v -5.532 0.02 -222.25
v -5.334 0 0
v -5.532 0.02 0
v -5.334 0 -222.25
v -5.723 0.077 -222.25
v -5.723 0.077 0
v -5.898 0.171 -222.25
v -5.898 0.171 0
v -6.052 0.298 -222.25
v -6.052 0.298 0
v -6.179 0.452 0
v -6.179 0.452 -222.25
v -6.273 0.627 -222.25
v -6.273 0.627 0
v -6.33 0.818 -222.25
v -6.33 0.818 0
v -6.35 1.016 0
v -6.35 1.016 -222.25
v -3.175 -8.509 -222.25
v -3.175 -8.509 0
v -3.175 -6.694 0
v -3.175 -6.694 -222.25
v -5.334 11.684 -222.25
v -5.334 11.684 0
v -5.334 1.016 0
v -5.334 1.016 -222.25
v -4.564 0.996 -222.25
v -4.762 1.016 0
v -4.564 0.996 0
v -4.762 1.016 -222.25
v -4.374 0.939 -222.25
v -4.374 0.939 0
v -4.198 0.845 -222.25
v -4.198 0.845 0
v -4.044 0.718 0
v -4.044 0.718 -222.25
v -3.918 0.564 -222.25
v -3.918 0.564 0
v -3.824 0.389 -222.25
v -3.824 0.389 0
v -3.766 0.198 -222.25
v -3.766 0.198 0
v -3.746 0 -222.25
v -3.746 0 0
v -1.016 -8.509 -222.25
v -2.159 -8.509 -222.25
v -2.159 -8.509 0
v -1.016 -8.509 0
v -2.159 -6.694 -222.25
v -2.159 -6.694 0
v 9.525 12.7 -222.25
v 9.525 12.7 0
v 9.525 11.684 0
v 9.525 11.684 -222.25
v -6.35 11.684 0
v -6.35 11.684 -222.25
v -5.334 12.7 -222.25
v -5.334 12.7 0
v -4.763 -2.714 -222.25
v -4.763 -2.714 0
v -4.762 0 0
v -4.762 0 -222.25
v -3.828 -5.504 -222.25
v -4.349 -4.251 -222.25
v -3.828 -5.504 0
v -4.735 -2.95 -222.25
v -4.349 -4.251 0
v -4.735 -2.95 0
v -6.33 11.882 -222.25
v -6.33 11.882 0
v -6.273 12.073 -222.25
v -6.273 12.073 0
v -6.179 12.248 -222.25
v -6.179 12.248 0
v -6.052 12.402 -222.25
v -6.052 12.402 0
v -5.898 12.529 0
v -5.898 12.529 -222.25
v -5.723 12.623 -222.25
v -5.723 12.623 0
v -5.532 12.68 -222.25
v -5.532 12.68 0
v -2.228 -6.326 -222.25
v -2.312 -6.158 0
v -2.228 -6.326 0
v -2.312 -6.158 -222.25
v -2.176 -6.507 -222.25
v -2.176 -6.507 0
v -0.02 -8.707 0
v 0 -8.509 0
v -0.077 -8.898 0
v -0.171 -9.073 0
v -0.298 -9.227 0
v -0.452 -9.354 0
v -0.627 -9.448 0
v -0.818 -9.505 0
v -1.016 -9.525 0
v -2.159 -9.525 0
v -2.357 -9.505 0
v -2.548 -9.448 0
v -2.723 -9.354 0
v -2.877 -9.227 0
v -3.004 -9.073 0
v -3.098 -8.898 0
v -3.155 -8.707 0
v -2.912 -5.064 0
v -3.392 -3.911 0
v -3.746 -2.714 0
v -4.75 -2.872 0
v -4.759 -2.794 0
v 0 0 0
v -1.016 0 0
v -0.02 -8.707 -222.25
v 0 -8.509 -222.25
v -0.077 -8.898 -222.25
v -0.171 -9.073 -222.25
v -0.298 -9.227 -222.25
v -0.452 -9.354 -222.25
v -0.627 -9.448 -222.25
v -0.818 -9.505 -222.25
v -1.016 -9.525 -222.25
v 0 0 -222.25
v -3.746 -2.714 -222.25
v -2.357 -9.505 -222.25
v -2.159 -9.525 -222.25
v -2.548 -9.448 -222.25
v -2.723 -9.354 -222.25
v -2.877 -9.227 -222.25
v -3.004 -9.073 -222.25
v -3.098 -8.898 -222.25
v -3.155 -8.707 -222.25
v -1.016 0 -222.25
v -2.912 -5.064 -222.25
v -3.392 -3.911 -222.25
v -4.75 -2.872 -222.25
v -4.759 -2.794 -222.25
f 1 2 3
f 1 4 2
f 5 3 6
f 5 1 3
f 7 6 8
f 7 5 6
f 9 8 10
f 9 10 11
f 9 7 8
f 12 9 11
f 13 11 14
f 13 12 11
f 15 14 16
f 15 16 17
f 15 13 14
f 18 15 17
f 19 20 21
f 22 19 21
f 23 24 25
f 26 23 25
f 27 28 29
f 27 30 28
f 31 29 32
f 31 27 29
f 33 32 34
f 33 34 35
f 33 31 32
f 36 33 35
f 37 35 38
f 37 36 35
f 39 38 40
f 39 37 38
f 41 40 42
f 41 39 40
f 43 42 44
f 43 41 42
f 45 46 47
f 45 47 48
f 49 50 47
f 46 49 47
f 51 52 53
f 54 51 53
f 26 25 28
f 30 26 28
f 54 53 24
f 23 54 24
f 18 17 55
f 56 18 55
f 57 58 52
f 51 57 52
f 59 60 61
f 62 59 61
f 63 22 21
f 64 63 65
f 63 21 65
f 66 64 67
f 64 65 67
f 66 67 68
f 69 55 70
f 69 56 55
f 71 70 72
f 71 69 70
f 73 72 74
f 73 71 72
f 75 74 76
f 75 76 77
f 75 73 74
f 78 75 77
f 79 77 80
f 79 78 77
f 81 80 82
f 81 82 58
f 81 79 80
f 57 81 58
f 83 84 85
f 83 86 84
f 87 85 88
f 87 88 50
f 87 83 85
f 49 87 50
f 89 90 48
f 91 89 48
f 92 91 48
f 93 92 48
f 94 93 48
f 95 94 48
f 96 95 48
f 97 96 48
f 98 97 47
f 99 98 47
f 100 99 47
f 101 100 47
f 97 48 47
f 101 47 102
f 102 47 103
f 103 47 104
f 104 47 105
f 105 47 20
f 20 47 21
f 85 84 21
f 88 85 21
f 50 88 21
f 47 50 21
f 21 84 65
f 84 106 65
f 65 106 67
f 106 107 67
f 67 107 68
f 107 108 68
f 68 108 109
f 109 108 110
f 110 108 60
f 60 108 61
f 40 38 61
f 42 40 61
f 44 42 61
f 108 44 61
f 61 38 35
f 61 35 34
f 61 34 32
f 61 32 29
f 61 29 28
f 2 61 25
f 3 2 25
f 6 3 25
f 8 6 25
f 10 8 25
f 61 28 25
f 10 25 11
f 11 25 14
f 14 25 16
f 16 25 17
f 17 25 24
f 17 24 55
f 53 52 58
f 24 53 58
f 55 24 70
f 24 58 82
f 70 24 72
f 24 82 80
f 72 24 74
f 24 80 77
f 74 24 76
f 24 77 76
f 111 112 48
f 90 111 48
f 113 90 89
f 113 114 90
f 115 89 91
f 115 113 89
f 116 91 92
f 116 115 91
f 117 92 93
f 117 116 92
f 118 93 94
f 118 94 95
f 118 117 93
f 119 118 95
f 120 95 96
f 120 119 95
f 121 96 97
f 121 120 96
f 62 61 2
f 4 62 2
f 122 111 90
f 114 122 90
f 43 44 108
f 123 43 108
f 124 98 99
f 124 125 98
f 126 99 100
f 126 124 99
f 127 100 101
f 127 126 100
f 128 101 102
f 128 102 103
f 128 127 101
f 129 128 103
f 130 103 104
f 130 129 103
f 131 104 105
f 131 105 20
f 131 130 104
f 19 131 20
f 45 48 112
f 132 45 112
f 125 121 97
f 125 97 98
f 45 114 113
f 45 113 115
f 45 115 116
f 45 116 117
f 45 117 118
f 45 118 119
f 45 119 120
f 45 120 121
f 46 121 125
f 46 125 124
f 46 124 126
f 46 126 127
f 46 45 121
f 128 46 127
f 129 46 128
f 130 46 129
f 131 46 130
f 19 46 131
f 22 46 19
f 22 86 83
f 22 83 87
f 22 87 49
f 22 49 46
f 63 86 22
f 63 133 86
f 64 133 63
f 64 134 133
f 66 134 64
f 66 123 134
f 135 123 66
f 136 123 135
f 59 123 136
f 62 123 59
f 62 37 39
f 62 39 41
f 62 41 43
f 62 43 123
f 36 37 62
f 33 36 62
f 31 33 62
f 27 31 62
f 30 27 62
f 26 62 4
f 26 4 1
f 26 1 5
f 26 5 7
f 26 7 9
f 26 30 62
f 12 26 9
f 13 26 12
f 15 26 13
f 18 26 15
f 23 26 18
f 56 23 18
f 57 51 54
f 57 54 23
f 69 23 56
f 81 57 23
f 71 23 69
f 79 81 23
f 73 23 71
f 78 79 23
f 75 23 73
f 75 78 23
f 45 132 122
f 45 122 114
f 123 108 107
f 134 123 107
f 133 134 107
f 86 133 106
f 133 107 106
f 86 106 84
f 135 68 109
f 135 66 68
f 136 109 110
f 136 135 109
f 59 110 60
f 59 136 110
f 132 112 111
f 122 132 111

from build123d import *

# Parameters (mm, degrees)
EXTRUDE_THIN1_DEPTH = 222.25
FILLET1_R           = 1.016


with BuildPart() as part:
    # Sketch1 → Extrude-Thin1 (new body)
    with BuildSketch(Plane.XY):
        with BuildLine():
            Line((0, 0), (0, -9.525))
            Line((0, -9.525), (-3.175, -9.525))
            Line((-3.175, -9.525), (-3.175, -6.693600755))
            ThreePointArc((-3.175, -6.693600755), (-4.128572785, -4.828192758), (-4.7625, -2.831399245))
            Line((-4.7625, -2.831399245), (-4.7625, 0))
            Line((-4.7625, 0), (-6.35, 0))
            Line((-6.35, 0), (-6.35, 12.7))
            Line((-6.35, 12.7), (9.525, 12.7))
            Line((9.525, 12.7), (9.525, 11.684))
            Line((9.525, 11.684), (-5.334, 11.684))
            Line((-5.334, 11.684), (-5.334, 1.016))
            Line((-5.334, 1.016), (-3.7465, 1.016))
            Line((-3.7465, 1.016), (-3.7465, -2.714277453))
            ThreePointArc((-3.7465, -2.714277453), (-3.111980098, -4.624554555), (-2.159, -6.397575437))
            Line((-2.159, -6.397575437), (-2.159, -8.509))
            Line((-2.159, -8.509), (-1.016, -8.509))
            Line((-1.016, -8.509), (-1.016, 0))
            Line((-1.016, 0), (0, 0))
        make_face()
    extrude(amount=-EXTRUDE_THIN1_DEPTH)

    # Fillet1
    fillet1_edges = [part.edges().sort_by_distance(p)[0] for p in [
        (-3.7465, 1.016, -111.125),
        (-2.159, -6.397575437, -111.125),
        (0, -9.525, -111.125),
        (-3.175, -9.525, -111.125),
        (-4.7625, -2.831399245, -111.125),
        (-6.35, 0, -111.125),
        (-6.35, 12.7, -111.125),
    ]]
    fillet(fillet1_edges, radius=FILLET1_R)


solid = part.part
